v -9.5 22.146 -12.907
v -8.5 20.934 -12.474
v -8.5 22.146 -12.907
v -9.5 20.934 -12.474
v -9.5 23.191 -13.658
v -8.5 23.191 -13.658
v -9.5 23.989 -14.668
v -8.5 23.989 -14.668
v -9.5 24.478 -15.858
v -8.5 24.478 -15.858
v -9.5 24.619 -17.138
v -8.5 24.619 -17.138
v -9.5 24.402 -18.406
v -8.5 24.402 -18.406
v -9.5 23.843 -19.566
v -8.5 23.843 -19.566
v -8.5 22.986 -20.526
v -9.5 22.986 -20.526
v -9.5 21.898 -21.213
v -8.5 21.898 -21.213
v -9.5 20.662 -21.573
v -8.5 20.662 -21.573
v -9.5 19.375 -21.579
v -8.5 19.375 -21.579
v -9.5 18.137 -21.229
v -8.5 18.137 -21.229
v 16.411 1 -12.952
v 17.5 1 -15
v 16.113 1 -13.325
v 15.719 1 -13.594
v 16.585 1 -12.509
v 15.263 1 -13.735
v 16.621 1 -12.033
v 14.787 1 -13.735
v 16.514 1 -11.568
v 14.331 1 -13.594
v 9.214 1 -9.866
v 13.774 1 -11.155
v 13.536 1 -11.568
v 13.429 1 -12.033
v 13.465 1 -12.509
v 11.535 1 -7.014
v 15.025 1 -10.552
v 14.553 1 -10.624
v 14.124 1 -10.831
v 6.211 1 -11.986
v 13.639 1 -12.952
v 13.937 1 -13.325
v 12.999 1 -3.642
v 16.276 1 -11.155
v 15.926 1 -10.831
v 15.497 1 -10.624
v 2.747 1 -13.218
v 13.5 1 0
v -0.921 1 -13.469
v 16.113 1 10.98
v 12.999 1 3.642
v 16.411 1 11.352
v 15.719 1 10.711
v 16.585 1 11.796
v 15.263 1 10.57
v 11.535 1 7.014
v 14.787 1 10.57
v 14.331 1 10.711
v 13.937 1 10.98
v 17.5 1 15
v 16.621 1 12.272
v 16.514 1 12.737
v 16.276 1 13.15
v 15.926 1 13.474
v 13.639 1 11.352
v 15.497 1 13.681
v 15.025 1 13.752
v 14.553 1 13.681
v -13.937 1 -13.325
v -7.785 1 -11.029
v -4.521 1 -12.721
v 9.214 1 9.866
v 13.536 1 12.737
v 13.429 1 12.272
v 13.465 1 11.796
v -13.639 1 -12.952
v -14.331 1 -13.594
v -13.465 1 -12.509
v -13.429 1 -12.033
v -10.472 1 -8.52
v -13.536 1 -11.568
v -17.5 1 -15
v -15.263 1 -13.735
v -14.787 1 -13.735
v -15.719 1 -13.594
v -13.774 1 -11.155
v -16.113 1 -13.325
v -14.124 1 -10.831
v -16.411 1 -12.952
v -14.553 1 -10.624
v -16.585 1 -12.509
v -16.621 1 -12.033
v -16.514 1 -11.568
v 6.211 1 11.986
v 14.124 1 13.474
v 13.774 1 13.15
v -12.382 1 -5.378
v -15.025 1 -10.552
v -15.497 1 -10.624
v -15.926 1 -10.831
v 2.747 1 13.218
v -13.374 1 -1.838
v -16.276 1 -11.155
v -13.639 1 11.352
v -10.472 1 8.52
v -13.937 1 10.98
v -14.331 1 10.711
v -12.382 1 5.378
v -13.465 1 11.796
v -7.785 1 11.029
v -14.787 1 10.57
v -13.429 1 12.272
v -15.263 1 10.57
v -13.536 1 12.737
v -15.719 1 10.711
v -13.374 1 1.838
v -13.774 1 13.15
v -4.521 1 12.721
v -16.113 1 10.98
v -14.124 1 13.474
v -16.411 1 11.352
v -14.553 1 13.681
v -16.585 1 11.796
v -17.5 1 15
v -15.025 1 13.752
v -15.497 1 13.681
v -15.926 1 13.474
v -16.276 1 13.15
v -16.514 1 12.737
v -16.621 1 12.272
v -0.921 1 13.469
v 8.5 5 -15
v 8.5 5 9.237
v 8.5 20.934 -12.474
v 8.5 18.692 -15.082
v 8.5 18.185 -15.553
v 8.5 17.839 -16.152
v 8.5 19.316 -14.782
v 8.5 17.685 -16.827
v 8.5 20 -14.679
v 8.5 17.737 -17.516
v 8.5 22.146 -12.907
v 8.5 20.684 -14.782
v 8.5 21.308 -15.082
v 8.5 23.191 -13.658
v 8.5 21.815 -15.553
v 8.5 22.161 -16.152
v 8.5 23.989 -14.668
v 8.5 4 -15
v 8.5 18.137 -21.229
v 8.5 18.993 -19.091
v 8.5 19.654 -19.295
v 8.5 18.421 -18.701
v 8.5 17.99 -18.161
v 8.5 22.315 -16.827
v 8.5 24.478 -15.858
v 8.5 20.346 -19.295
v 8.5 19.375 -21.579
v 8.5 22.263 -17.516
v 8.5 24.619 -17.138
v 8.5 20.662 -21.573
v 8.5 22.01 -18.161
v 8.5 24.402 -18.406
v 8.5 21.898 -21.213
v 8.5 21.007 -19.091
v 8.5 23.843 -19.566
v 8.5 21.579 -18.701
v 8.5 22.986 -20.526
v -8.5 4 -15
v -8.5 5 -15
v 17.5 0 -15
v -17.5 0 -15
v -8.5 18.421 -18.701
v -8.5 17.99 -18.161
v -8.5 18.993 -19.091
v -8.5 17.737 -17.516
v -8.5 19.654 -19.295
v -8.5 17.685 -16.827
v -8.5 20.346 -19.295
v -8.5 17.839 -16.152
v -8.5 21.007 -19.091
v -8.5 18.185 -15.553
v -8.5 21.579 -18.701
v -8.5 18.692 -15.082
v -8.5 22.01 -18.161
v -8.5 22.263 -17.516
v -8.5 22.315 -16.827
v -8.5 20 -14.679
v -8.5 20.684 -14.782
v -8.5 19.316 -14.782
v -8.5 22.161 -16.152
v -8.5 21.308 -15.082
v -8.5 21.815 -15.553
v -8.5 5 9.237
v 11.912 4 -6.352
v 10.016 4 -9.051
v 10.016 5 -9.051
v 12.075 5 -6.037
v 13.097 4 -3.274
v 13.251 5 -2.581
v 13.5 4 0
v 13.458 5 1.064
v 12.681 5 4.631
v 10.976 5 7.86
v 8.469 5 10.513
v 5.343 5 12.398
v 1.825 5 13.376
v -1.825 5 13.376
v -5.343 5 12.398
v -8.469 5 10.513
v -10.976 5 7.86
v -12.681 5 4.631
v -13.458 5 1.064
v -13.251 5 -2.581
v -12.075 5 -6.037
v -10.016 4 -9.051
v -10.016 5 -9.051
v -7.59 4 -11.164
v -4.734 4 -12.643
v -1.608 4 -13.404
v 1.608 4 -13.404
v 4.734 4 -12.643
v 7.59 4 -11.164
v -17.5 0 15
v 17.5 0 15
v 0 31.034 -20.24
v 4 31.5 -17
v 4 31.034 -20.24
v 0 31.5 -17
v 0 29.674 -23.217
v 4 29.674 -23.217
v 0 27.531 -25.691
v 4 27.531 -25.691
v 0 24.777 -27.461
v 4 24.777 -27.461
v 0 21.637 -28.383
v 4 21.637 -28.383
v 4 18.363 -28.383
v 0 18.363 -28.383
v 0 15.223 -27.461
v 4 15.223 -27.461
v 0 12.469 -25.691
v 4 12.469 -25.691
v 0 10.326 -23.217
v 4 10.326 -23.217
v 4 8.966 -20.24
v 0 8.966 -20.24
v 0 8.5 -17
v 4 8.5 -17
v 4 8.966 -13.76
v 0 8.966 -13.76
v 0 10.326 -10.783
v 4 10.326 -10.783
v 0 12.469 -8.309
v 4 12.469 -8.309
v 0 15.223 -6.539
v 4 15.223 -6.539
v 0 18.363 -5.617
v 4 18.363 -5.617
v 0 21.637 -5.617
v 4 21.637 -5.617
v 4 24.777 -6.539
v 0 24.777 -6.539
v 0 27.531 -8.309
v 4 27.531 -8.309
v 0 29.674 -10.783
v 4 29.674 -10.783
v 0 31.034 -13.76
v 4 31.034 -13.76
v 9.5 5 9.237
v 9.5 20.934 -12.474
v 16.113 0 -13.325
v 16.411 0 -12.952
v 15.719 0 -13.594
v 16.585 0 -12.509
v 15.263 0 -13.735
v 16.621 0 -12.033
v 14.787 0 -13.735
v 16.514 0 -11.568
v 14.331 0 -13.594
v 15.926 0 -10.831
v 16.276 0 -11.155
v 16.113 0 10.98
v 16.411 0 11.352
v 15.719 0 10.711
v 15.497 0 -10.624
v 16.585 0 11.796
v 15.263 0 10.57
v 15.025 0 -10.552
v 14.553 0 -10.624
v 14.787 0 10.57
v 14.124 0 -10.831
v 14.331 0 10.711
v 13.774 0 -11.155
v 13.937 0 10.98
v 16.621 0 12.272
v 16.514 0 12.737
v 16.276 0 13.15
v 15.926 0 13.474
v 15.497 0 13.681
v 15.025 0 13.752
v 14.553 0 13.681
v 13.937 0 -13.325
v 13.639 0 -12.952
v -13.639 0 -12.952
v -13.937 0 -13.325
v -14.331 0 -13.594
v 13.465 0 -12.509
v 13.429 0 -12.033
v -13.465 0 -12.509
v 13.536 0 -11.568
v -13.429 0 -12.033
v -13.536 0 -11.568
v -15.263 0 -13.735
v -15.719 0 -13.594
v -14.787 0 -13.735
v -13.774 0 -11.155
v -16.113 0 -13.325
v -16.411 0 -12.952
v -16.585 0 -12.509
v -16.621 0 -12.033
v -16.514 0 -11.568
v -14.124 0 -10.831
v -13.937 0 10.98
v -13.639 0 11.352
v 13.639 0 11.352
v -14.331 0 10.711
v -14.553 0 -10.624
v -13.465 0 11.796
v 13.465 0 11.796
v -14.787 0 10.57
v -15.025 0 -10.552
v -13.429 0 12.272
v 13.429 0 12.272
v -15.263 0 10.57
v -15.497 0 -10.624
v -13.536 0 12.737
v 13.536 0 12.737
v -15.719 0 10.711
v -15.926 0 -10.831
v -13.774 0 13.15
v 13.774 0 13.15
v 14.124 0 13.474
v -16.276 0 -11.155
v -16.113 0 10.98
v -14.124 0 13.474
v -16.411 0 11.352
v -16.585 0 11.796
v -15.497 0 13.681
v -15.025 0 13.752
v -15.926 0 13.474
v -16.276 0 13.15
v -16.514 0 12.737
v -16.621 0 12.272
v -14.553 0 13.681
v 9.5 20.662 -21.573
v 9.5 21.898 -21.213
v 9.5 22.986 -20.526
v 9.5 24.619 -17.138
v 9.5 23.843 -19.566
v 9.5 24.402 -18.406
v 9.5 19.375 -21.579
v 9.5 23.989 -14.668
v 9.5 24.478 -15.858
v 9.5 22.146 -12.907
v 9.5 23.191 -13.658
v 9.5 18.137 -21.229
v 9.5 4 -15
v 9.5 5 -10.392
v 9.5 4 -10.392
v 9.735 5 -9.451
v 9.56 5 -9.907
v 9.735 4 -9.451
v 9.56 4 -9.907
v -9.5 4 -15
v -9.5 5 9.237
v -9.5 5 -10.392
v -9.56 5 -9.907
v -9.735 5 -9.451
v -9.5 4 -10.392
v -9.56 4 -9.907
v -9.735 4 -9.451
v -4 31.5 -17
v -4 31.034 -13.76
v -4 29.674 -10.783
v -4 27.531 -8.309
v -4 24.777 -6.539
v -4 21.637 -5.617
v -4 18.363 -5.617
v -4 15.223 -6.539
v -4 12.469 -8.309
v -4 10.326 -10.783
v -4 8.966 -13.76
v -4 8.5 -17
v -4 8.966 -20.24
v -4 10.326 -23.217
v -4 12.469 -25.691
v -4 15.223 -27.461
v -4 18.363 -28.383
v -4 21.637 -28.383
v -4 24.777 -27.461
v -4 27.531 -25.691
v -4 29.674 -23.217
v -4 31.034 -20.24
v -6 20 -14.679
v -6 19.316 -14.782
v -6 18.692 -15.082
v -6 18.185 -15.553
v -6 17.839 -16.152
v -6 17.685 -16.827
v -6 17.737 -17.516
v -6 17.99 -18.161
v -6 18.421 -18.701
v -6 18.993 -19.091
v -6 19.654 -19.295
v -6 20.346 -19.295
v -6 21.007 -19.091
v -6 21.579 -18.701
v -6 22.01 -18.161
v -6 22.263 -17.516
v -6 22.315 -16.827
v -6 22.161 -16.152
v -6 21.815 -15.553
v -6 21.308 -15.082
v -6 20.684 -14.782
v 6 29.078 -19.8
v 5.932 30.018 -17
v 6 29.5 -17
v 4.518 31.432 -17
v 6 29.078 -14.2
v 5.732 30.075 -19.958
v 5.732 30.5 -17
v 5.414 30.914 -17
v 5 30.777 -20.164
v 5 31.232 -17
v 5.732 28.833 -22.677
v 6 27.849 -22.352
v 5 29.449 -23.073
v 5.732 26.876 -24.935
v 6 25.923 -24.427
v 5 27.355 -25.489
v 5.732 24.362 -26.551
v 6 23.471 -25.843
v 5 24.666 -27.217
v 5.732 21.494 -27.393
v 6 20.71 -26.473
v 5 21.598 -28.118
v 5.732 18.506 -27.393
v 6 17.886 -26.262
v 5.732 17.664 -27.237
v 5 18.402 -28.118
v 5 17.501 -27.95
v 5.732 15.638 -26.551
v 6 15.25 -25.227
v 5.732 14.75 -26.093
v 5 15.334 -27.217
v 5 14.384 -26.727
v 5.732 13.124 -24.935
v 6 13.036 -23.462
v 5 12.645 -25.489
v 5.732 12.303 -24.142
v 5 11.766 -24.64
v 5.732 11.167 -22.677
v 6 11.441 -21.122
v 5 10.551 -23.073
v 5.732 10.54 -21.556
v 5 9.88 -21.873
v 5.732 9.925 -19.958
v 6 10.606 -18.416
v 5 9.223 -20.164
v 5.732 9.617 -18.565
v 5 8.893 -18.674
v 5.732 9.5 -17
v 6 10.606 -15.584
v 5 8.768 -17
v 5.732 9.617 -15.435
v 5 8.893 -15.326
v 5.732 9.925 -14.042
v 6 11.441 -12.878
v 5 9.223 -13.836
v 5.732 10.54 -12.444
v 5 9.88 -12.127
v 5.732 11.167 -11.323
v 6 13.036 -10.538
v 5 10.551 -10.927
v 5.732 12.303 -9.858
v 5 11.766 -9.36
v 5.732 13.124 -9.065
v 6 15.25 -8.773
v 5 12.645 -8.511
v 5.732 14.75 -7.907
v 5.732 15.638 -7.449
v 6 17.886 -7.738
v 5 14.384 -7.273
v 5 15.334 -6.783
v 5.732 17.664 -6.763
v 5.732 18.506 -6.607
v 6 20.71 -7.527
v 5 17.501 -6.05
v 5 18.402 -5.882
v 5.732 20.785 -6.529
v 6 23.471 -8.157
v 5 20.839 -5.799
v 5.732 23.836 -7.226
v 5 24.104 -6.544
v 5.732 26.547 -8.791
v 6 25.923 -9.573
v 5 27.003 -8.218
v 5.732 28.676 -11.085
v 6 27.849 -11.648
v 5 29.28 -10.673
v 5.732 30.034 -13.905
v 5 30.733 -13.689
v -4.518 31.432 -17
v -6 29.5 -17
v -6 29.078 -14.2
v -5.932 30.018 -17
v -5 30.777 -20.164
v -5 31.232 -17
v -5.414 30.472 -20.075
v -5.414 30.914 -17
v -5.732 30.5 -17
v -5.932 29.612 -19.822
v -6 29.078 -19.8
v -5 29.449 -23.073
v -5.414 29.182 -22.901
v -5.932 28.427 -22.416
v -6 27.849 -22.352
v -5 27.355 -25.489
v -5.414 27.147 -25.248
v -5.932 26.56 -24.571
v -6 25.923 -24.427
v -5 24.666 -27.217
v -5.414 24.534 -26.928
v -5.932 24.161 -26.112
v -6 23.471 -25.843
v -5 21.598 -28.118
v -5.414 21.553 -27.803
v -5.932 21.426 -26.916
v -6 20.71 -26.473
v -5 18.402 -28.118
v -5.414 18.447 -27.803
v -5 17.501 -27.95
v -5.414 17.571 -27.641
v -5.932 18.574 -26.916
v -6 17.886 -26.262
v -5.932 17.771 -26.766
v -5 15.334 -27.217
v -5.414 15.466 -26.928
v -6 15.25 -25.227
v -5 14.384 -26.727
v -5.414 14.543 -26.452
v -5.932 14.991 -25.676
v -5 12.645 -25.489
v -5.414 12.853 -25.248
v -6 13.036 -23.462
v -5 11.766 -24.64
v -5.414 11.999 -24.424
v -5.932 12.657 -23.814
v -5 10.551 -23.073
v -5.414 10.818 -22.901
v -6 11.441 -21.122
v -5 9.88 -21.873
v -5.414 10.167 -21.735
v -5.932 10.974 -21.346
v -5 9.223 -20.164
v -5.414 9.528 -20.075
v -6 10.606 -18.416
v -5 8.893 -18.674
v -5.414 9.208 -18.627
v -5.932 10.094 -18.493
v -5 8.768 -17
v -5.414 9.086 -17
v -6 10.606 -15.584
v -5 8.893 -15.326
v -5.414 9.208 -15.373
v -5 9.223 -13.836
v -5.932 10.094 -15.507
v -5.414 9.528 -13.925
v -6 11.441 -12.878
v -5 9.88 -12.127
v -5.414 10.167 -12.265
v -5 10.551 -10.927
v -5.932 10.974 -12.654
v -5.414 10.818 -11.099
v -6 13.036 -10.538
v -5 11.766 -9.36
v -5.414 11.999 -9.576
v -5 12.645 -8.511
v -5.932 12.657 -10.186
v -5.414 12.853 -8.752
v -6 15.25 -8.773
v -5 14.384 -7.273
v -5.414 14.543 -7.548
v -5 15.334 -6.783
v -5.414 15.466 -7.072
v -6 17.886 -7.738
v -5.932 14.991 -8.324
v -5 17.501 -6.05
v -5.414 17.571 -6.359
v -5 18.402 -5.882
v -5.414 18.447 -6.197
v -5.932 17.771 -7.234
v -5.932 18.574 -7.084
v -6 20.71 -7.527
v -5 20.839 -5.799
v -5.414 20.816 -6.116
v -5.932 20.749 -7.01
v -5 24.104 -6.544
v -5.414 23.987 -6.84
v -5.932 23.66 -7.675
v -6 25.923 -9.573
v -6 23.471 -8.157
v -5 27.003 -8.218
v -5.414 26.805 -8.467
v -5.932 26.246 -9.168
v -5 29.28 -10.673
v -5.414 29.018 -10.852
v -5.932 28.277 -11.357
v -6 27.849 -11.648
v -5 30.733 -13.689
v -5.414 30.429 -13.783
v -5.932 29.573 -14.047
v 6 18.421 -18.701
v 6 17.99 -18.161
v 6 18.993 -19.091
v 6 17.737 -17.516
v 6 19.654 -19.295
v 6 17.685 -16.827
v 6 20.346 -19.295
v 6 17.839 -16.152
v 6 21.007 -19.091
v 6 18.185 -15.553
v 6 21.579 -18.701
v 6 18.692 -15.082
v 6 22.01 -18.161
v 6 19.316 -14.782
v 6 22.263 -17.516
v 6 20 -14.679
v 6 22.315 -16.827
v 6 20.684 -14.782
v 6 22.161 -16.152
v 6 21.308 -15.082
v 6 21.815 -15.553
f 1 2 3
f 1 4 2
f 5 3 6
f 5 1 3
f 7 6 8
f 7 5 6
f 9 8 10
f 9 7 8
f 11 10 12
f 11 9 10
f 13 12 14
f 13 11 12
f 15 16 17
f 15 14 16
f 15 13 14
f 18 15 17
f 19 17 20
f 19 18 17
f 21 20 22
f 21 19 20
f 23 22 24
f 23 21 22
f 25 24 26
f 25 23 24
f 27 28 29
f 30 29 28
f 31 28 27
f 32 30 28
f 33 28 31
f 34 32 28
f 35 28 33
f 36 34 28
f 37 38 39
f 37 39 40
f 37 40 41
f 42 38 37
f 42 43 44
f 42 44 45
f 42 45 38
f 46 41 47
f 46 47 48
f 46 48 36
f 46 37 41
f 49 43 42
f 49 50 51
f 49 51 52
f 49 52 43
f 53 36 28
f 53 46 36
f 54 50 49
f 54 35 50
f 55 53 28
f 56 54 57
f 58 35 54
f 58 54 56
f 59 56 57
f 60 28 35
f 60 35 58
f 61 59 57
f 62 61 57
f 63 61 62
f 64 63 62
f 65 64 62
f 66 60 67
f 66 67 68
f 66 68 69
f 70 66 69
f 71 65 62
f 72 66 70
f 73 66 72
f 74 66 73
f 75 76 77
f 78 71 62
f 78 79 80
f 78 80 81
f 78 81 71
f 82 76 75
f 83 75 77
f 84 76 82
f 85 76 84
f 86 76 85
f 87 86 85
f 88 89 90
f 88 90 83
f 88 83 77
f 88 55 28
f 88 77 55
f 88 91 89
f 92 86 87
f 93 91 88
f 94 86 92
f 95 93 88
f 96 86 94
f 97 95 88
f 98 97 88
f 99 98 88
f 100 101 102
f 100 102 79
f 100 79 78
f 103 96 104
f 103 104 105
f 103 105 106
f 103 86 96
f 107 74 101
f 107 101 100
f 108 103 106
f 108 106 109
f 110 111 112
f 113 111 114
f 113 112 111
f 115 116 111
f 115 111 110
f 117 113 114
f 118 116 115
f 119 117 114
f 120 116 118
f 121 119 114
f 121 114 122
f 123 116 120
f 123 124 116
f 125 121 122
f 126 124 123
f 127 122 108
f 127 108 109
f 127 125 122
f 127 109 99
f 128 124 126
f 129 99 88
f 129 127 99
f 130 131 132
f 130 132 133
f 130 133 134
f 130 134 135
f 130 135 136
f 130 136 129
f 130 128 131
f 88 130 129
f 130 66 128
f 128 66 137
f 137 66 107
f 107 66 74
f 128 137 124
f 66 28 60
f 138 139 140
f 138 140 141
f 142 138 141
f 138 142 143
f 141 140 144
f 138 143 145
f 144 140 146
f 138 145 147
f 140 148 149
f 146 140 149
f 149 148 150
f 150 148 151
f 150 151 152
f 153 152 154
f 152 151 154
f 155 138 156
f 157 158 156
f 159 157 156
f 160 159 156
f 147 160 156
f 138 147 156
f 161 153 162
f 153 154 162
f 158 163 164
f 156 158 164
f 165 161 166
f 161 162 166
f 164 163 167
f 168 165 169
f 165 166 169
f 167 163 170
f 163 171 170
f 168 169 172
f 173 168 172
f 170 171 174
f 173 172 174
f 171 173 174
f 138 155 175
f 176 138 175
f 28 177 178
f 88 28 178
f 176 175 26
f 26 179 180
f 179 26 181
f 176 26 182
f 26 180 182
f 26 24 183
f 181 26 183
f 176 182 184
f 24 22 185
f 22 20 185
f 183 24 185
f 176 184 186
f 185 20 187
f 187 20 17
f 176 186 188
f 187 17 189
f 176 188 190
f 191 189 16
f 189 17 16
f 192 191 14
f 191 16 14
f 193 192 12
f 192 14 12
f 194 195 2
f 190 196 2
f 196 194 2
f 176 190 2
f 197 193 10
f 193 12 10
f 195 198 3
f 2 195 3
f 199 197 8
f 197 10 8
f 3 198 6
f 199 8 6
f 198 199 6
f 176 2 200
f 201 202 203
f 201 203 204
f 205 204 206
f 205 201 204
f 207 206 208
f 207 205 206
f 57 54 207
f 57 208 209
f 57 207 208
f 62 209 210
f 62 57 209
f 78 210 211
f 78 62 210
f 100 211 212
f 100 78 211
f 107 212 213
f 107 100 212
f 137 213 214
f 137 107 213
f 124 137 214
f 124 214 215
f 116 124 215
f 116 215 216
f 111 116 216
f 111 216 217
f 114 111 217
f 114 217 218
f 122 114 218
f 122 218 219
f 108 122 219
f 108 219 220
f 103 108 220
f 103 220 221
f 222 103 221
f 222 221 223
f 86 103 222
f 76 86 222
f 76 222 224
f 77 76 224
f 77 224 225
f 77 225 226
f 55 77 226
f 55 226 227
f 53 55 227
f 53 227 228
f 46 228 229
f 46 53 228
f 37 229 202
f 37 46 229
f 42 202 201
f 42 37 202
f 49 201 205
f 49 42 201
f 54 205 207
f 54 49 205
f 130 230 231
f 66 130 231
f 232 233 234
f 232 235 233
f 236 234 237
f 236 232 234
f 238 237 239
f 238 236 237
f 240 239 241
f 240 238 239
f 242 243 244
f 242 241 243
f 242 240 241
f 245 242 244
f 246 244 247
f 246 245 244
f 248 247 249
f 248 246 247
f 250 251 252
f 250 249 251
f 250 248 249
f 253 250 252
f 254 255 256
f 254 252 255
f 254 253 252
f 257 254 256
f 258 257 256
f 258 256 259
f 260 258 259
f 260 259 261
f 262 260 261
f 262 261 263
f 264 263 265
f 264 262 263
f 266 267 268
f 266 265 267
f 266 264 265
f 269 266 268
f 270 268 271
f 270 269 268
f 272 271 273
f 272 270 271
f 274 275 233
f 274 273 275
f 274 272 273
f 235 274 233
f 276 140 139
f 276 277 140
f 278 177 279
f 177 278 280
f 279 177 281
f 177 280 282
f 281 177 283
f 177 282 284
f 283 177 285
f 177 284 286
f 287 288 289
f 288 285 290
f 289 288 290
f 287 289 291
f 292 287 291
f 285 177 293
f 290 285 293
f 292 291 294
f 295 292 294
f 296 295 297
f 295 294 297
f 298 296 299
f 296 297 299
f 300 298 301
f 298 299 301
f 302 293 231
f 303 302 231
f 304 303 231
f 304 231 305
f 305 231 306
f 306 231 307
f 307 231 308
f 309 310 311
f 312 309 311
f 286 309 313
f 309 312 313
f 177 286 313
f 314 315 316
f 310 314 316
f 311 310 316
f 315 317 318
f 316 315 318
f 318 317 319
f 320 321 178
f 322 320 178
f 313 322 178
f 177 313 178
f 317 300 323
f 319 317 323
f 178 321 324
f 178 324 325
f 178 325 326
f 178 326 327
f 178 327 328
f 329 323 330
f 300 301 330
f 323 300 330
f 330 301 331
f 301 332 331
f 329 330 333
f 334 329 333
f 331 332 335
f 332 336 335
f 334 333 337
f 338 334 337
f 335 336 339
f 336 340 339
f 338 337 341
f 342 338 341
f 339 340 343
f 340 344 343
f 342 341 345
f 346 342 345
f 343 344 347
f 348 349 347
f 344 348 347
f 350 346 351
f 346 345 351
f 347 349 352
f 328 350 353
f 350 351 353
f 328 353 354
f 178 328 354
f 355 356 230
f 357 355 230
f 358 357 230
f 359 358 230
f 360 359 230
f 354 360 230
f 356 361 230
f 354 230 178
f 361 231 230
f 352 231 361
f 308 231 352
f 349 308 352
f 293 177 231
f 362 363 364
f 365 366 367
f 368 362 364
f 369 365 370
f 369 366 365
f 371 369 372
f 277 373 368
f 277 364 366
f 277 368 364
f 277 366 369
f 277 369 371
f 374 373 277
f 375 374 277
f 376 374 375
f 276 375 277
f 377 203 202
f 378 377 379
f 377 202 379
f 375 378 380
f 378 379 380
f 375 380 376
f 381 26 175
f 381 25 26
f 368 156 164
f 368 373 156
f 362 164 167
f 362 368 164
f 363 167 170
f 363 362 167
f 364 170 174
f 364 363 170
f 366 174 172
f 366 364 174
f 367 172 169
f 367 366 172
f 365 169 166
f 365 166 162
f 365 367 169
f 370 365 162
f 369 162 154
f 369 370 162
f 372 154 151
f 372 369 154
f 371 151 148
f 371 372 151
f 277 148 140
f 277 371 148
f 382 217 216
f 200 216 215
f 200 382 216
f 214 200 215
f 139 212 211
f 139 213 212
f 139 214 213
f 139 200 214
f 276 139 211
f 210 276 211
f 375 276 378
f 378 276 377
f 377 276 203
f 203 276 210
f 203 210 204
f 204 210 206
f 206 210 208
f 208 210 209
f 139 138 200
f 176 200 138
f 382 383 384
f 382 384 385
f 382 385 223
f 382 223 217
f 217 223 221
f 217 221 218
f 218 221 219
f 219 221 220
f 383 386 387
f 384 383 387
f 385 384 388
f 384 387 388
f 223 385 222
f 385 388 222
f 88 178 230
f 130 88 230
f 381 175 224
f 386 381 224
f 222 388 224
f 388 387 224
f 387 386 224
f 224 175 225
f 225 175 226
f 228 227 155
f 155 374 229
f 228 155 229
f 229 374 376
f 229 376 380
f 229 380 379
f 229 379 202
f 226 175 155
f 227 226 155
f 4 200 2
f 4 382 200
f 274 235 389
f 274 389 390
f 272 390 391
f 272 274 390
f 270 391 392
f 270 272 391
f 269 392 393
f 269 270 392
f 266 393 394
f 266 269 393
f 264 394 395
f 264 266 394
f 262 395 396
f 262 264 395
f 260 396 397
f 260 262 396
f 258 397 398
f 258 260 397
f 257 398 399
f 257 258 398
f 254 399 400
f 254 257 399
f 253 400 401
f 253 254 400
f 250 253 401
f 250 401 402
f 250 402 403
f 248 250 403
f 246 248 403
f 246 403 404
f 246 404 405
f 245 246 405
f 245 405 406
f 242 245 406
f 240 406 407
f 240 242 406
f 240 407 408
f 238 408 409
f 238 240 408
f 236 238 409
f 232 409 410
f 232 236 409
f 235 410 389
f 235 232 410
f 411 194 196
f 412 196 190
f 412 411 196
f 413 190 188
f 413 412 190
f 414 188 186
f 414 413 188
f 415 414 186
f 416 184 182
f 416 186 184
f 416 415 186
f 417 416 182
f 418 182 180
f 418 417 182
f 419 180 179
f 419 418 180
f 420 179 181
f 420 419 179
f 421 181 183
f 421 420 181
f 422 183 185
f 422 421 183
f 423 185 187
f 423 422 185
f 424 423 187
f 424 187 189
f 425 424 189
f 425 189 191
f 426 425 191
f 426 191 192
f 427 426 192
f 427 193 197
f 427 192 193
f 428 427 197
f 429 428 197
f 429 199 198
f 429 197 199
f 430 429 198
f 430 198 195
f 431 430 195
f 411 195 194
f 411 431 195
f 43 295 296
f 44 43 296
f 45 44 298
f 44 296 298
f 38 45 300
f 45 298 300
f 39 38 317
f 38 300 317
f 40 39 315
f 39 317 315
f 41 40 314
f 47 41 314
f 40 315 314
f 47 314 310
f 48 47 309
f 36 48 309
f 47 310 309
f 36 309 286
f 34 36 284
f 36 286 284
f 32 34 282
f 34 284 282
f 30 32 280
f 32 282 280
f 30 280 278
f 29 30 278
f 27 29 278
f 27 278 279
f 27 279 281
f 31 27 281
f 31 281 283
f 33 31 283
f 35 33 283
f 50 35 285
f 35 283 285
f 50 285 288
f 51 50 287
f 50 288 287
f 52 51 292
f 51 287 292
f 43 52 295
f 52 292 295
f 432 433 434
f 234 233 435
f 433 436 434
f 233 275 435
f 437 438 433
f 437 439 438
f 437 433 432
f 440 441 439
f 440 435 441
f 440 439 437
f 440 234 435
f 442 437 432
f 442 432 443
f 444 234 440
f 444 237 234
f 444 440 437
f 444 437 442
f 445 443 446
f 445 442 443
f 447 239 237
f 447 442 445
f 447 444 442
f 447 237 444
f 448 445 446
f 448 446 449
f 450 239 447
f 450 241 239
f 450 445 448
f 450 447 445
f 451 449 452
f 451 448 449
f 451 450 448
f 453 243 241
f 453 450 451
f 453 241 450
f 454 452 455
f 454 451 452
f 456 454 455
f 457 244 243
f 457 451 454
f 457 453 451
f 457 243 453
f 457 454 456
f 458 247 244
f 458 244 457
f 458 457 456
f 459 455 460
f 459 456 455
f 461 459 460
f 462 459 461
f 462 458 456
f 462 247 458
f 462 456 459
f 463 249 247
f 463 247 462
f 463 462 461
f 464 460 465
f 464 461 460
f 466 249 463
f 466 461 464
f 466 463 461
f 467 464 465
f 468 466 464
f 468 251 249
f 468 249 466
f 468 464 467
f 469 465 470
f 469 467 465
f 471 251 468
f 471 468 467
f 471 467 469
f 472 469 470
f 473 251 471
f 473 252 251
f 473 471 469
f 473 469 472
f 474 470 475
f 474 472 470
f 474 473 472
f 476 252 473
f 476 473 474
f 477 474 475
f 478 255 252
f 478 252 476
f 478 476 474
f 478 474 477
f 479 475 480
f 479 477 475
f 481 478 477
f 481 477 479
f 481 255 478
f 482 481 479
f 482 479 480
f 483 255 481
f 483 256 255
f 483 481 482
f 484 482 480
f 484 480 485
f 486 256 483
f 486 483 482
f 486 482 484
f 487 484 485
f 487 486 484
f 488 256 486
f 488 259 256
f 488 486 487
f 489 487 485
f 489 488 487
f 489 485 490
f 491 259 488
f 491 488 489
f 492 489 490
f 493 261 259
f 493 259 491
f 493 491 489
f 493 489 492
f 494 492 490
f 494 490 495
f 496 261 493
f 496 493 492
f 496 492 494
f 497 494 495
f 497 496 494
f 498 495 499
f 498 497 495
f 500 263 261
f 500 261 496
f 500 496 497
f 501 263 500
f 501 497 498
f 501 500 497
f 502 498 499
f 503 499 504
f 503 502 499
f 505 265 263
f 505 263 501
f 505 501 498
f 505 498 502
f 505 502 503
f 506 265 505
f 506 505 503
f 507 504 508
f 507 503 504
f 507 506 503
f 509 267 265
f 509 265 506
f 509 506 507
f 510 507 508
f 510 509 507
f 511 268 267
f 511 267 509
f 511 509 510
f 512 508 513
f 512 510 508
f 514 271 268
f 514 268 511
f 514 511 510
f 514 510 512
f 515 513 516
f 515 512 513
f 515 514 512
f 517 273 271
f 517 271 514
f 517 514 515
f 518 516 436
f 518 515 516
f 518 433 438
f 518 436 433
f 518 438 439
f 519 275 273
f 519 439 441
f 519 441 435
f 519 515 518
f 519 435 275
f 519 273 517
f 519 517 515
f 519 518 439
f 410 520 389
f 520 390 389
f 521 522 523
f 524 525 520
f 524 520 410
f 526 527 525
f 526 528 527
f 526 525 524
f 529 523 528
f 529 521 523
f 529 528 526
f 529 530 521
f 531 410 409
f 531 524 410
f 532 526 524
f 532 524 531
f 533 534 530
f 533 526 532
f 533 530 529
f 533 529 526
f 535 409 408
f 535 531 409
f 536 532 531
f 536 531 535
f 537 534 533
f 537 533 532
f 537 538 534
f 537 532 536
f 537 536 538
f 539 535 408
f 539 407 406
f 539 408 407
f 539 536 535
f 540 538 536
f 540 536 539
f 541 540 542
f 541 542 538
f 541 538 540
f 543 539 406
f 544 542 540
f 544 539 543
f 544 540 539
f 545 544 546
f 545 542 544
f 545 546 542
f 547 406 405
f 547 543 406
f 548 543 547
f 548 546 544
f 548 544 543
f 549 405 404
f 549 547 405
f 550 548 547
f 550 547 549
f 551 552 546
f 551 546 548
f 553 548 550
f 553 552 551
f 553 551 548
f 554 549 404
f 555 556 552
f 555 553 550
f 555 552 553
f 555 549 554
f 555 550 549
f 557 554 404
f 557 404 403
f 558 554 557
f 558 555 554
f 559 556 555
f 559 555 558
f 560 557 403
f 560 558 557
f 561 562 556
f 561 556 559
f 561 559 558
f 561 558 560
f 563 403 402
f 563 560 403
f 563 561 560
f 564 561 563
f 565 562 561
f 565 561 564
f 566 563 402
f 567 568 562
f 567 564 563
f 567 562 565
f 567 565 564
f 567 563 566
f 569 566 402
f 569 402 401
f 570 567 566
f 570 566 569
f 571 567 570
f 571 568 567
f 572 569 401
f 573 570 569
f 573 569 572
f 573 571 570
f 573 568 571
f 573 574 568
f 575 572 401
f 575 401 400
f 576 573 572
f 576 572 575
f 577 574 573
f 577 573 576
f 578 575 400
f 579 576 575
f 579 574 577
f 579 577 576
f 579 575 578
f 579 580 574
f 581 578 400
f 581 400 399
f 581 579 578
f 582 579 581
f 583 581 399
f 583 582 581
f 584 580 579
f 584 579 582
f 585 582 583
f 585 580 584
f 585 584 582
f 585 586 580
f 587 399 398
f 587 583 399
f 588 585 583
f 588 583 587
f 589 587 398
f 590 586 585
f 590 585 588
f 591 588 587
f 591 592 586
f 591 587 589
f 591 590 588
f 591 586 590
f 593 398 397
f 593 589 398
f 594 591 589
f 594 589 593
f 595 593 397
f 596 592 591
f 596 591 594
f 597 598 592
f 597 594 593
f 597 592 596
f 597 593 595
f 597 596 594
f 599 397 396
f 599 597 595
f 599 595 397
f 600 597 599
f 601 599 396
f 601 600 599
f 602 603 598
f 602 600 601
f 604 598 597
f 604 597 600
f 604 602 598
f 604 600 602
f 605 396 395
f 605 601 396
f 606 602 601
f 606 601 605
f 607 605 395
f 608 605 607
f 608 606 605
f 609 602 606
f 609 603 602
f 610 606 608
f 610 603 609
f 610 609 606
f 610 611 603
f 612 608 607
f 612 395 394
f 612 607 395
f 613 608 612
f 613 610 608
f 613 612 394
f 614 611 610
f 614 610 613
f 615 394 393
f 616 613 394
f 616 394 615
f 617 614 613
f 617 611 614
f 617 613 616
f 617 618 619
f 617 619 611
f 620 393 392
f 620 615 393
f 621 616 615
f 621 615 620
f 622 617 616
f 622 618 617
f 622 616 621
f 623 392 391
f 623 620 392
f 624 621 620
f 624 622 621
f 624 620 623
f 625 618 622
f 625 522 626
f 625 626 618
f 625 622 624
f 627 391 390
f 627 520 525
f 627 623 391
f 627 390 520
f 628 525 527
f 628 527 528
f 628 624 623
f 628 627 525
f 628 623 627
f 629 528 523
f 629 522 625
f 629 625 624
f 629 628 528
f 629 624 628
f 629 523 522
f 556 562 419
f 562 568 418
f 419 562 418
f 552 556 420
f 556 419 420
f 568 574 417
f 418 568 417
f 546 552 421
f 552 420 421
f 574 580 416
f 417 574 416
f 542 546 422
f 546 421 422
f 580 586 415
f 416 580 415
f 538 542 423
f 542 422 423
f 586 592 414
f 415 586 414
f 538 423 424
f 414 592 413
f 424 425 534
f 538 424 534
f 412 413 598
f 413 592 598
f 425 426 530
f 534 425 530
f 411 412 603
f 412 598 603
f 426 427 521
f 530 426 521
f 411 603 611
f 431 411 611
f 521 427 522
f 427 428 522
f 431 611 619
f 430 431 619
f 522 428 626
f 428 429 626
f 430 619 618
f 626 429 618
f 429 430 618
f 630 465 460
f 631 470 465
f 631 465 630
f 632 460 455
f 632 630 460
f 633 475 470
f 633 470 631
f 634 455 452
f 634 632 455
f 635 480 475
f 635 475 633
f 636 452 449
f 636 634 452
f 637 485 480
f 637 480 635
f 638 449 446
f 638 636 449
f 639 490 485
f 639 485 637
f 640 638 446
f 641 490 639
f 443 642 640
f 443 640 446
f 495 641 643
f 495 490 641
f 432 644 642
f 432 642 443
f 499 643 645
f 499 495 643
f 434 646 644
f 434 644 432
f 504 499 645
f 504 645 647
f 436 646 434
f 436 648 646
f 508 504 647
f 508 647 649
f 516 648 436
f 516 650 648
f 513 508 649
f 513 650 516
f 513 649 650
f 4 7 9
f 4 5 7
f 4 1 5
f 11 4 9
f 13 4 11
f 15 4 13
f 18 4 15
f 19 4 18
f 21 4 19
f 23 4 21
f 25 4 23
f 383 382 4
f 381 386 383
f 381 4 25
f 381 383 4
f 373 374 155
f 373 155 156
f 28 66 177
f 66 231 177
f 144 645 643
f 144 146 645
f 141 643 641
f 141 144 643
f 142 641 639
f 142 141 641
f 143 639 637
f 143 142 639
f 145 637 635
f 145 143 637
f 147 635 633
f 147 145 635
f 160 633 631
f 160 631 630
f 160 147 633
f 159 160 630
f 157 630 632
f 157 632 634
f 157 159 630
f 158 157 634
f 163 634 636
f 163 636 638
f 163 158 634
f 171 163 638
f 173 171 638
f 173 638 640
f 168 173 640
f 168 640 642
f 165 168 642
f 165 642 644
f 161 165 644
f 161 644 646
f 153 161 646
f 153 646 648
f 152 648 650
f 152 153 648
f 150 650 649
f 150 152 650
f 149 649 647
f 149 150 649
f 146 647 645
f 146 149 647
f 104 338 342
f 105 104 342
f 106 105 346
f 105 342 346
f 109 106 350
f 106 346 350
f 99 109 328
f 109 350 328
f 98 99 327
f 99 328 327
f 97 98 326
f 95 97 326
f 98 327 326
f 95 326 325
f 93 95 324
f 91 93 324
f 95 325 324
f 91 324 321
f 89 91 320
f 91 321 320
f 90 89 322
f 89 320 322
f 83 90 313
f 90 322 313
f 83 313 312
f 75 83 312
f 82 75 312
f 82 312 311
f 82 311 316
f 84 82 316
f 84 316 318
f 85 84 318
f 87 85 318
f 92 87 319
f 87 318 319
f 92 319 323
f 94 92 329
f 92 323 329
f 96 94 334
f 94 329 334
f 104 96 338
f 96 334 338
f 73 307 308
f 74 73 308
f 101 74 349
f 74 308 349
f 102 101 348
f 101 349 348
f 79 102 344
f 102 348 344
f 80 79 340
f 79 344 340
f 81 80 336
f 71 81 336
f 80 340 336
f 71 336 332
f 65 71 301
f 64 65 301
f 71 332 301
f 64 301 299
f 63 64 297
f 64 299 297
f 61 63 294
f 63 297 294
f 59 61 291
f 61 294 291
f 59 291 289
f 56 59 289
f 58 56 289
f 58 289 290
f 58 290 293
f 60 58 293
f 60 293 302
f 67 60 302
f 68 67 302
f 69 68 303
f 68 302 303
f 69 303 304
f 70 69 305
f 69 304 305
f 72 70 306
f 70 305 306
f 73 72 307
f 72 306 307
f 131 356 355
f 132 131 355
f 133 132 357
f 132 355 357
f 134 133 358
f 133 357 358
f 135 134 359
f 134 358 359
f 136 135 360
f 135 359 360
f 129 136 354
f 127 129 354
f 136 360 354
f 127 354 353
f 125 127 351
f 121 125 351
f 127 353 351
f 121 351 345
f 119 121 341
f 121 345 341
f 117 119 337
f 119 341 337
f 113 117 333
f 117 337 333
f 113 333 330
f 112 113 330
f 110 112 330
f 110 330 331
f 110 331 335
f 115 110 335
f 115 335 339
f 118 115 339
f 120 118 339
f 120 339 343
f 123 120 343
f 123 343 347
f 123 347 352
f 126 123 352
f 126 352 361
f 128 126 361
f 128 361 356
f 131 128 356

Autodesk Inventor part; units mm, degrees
ref_plane "YZ Plane" through (0, 0, 0) normal (1, 0, 0) x (0, 1, 0)
ref_plane "XZ Plane" through (0, 0, 0) normal (0, 1, 0) x (-1, 0, 0)
ref_plane "XY Plane" through (0, 0, 0) normal (0, 0, 1) x (1, 0, 0)
sketch "Sketch1" plane through (0, 0, 0) normal (0, 1, 0) x (-1, 0, 0)
  line L0 (17.5, 15) -> (-17.5, 15)
  line L1 (-17.5, 15) -> (-17.5, -15)
  line L2 (-17.5, -15) -> (17.5, -15)
  line L3 (17.5, -15) -> (17.5, 15)
  line L4 (17.5, 15) -> (-17.5, -15) construction
  line L5 (-17.5, 15) -> (17.5, -15) construction
  point P0 (0, 0)
  dimension "d0" = 35
  dimension "d1" = 30
extrude "Extrusion1" add sketch "Sketch1" along normal blind 1
sketch "Sketch2" plane through (0, 1, 0) normal (0, 1, 0) x (1, 0, 0)
  line L0 (-17.5, 15) -> (-17.5, -15) projected
  line L1 (-17.5, 0) -> (17.5, 0)
  line L2 (17.5, -15) -> (17.5, 15) projected
  line L3 (-17.5, -15) -> (17.5, -15) projected
  line L4 (0, -15) -> (0, 15)
  line L5 (17.5, 15) -> (-17.5, 15) projected
  point P0 (0, 0)
  point P1 (-15.025, -12.1525)
  point P2 (-15.025, 12.1525)
  point P3 (15.025, -12.1525)
  point P4 (15.025, 12.1525)
  dimension "d11" = 15.025
  dimension "d12" = 12.1525
hole "Hole1" at (-15.025, 1, 12.1525) at (-15.025, 1, -12.1525) at (15.025, 1, -12.1525) at (15.025, 1, 12.1525) direction (0, -1, 0) diameter 3.2 end through all clearance for "Countersunk Flat Head Screw DIN EN ISO 2009" size "M3" standard "DIN"
sketch "Sketch3" plane through (0, 1, 0) normal (0, 1, 0) x (1, 0, 0)
  circle A0 centre (0, 0) radius 13.5
  dimension "d13" = 27
extrude "Extrusion2" add sketch "Sketch3" along normal blind 3
sketch "Sketch4" plane through (0, 4, 0) normal (0, 1, 0) x (1, 0, 0)
  circle A0 centre (0, 0) radius 13.5 projected
  line L0 (17.5, 15) -> (-17.5, 15) projected
  line L1 (-9.5, 15) -> (9.5, 15)
  line L2 (9.5, 15) -> (9.5, 8)
  line L3 (9.5, 8) -> (-9.5, 8)
  line L4 (-9.5, 8) -> (-9.5, 15)
  line L5 (-9.5, 15) -> (9.5, 8) construction
  line L6 (9.5, 15) -> (-9.5, 8) construction
  point P0 (0, 11.5)
  point P1 (0, 8)
  point P2 (-9.5, 9.5917)
  point P3 (9.5, 9.5917)
  dimension "d16" = 19
  dimension "d17" = 7
extrude "Extrusion3" add sketch "Sketch4" along normal blind 1
sketch "Sketch5" plane through (9.5, 4, -9.5917) normal (1, 0, 0) x (0, 0, -1)
  line L0 (0, 0) -> (5.4083, 0) projected
  line L1 (5.4083, 0) -> (11.637, 14.1369)
  arc A0 (11.637, 14.1369) -> (2.8827, 16.9336) centre (7.4083, 16) ccw
  line L2 (2.8827, 16.9336) -> (0, 0)
  line L3 (2.8827, 16.9336) -> (-18.8286, 1)
  line L4 (0, 1) -> (-23.0917, 1) projected
  line L5 (0, 1) -> (1.0062, 1)
  line L6 (5.4083, 1) -> (0, 1) projected
  point P0 (-9.5917, -4)
  point P1 (0.1702, 1)
  dimension "d20" = 16
  dimension "d31" = 2
extrude "Extrusion4" add sketch "Sketch5" against normal blind 1
mirror "Mirror1" about plane through (0, 0, 0) normal (1, 0, 0) of "Extrusion4"
fillet "Fillet2" radius 2 2 edges at (-9.5, 4.5, -9.5917) (9.5, 4.5, -9.5917)
sketch "Sketch6" plane through (0, 0, 0) normal (1, 0, 0) x (0, 1, 0)
  arc A0 (18.1369, -21.2287) -> (20.9336, -12.4744) centre (20, -17) ccw projected
  circle A1 centre (20, -17) radius 11.5
  point P0 (0, 0)
  dimension "d25" = 23
extrude "Extrusion5" add sketch "Sketch6" along normal mid plane 12
sketch "Sketch7" plane through (8.5, 4, -9.5917) normal (-1, 0, 0) x (0, 0, 1)
  arc A0 (-2.8827, 16.9336) -> (-11.637, 14.1369) centre (-7.4083, 16) ccw projected
  circle A1 centre (-7.4083, 16) radius 2.3211
  point P0 (9.5917, -4)
extrude "Extrusion6" add sketch "Sketch7" along normal up to surface (17 mm away)
fillet "Fillet3" radius 2 2 edges at (6, 8.5, -17) (-6, 8.5, -17)
properties part number "rearaxle" material "Stainless Steel AISI 440C, Welded"
